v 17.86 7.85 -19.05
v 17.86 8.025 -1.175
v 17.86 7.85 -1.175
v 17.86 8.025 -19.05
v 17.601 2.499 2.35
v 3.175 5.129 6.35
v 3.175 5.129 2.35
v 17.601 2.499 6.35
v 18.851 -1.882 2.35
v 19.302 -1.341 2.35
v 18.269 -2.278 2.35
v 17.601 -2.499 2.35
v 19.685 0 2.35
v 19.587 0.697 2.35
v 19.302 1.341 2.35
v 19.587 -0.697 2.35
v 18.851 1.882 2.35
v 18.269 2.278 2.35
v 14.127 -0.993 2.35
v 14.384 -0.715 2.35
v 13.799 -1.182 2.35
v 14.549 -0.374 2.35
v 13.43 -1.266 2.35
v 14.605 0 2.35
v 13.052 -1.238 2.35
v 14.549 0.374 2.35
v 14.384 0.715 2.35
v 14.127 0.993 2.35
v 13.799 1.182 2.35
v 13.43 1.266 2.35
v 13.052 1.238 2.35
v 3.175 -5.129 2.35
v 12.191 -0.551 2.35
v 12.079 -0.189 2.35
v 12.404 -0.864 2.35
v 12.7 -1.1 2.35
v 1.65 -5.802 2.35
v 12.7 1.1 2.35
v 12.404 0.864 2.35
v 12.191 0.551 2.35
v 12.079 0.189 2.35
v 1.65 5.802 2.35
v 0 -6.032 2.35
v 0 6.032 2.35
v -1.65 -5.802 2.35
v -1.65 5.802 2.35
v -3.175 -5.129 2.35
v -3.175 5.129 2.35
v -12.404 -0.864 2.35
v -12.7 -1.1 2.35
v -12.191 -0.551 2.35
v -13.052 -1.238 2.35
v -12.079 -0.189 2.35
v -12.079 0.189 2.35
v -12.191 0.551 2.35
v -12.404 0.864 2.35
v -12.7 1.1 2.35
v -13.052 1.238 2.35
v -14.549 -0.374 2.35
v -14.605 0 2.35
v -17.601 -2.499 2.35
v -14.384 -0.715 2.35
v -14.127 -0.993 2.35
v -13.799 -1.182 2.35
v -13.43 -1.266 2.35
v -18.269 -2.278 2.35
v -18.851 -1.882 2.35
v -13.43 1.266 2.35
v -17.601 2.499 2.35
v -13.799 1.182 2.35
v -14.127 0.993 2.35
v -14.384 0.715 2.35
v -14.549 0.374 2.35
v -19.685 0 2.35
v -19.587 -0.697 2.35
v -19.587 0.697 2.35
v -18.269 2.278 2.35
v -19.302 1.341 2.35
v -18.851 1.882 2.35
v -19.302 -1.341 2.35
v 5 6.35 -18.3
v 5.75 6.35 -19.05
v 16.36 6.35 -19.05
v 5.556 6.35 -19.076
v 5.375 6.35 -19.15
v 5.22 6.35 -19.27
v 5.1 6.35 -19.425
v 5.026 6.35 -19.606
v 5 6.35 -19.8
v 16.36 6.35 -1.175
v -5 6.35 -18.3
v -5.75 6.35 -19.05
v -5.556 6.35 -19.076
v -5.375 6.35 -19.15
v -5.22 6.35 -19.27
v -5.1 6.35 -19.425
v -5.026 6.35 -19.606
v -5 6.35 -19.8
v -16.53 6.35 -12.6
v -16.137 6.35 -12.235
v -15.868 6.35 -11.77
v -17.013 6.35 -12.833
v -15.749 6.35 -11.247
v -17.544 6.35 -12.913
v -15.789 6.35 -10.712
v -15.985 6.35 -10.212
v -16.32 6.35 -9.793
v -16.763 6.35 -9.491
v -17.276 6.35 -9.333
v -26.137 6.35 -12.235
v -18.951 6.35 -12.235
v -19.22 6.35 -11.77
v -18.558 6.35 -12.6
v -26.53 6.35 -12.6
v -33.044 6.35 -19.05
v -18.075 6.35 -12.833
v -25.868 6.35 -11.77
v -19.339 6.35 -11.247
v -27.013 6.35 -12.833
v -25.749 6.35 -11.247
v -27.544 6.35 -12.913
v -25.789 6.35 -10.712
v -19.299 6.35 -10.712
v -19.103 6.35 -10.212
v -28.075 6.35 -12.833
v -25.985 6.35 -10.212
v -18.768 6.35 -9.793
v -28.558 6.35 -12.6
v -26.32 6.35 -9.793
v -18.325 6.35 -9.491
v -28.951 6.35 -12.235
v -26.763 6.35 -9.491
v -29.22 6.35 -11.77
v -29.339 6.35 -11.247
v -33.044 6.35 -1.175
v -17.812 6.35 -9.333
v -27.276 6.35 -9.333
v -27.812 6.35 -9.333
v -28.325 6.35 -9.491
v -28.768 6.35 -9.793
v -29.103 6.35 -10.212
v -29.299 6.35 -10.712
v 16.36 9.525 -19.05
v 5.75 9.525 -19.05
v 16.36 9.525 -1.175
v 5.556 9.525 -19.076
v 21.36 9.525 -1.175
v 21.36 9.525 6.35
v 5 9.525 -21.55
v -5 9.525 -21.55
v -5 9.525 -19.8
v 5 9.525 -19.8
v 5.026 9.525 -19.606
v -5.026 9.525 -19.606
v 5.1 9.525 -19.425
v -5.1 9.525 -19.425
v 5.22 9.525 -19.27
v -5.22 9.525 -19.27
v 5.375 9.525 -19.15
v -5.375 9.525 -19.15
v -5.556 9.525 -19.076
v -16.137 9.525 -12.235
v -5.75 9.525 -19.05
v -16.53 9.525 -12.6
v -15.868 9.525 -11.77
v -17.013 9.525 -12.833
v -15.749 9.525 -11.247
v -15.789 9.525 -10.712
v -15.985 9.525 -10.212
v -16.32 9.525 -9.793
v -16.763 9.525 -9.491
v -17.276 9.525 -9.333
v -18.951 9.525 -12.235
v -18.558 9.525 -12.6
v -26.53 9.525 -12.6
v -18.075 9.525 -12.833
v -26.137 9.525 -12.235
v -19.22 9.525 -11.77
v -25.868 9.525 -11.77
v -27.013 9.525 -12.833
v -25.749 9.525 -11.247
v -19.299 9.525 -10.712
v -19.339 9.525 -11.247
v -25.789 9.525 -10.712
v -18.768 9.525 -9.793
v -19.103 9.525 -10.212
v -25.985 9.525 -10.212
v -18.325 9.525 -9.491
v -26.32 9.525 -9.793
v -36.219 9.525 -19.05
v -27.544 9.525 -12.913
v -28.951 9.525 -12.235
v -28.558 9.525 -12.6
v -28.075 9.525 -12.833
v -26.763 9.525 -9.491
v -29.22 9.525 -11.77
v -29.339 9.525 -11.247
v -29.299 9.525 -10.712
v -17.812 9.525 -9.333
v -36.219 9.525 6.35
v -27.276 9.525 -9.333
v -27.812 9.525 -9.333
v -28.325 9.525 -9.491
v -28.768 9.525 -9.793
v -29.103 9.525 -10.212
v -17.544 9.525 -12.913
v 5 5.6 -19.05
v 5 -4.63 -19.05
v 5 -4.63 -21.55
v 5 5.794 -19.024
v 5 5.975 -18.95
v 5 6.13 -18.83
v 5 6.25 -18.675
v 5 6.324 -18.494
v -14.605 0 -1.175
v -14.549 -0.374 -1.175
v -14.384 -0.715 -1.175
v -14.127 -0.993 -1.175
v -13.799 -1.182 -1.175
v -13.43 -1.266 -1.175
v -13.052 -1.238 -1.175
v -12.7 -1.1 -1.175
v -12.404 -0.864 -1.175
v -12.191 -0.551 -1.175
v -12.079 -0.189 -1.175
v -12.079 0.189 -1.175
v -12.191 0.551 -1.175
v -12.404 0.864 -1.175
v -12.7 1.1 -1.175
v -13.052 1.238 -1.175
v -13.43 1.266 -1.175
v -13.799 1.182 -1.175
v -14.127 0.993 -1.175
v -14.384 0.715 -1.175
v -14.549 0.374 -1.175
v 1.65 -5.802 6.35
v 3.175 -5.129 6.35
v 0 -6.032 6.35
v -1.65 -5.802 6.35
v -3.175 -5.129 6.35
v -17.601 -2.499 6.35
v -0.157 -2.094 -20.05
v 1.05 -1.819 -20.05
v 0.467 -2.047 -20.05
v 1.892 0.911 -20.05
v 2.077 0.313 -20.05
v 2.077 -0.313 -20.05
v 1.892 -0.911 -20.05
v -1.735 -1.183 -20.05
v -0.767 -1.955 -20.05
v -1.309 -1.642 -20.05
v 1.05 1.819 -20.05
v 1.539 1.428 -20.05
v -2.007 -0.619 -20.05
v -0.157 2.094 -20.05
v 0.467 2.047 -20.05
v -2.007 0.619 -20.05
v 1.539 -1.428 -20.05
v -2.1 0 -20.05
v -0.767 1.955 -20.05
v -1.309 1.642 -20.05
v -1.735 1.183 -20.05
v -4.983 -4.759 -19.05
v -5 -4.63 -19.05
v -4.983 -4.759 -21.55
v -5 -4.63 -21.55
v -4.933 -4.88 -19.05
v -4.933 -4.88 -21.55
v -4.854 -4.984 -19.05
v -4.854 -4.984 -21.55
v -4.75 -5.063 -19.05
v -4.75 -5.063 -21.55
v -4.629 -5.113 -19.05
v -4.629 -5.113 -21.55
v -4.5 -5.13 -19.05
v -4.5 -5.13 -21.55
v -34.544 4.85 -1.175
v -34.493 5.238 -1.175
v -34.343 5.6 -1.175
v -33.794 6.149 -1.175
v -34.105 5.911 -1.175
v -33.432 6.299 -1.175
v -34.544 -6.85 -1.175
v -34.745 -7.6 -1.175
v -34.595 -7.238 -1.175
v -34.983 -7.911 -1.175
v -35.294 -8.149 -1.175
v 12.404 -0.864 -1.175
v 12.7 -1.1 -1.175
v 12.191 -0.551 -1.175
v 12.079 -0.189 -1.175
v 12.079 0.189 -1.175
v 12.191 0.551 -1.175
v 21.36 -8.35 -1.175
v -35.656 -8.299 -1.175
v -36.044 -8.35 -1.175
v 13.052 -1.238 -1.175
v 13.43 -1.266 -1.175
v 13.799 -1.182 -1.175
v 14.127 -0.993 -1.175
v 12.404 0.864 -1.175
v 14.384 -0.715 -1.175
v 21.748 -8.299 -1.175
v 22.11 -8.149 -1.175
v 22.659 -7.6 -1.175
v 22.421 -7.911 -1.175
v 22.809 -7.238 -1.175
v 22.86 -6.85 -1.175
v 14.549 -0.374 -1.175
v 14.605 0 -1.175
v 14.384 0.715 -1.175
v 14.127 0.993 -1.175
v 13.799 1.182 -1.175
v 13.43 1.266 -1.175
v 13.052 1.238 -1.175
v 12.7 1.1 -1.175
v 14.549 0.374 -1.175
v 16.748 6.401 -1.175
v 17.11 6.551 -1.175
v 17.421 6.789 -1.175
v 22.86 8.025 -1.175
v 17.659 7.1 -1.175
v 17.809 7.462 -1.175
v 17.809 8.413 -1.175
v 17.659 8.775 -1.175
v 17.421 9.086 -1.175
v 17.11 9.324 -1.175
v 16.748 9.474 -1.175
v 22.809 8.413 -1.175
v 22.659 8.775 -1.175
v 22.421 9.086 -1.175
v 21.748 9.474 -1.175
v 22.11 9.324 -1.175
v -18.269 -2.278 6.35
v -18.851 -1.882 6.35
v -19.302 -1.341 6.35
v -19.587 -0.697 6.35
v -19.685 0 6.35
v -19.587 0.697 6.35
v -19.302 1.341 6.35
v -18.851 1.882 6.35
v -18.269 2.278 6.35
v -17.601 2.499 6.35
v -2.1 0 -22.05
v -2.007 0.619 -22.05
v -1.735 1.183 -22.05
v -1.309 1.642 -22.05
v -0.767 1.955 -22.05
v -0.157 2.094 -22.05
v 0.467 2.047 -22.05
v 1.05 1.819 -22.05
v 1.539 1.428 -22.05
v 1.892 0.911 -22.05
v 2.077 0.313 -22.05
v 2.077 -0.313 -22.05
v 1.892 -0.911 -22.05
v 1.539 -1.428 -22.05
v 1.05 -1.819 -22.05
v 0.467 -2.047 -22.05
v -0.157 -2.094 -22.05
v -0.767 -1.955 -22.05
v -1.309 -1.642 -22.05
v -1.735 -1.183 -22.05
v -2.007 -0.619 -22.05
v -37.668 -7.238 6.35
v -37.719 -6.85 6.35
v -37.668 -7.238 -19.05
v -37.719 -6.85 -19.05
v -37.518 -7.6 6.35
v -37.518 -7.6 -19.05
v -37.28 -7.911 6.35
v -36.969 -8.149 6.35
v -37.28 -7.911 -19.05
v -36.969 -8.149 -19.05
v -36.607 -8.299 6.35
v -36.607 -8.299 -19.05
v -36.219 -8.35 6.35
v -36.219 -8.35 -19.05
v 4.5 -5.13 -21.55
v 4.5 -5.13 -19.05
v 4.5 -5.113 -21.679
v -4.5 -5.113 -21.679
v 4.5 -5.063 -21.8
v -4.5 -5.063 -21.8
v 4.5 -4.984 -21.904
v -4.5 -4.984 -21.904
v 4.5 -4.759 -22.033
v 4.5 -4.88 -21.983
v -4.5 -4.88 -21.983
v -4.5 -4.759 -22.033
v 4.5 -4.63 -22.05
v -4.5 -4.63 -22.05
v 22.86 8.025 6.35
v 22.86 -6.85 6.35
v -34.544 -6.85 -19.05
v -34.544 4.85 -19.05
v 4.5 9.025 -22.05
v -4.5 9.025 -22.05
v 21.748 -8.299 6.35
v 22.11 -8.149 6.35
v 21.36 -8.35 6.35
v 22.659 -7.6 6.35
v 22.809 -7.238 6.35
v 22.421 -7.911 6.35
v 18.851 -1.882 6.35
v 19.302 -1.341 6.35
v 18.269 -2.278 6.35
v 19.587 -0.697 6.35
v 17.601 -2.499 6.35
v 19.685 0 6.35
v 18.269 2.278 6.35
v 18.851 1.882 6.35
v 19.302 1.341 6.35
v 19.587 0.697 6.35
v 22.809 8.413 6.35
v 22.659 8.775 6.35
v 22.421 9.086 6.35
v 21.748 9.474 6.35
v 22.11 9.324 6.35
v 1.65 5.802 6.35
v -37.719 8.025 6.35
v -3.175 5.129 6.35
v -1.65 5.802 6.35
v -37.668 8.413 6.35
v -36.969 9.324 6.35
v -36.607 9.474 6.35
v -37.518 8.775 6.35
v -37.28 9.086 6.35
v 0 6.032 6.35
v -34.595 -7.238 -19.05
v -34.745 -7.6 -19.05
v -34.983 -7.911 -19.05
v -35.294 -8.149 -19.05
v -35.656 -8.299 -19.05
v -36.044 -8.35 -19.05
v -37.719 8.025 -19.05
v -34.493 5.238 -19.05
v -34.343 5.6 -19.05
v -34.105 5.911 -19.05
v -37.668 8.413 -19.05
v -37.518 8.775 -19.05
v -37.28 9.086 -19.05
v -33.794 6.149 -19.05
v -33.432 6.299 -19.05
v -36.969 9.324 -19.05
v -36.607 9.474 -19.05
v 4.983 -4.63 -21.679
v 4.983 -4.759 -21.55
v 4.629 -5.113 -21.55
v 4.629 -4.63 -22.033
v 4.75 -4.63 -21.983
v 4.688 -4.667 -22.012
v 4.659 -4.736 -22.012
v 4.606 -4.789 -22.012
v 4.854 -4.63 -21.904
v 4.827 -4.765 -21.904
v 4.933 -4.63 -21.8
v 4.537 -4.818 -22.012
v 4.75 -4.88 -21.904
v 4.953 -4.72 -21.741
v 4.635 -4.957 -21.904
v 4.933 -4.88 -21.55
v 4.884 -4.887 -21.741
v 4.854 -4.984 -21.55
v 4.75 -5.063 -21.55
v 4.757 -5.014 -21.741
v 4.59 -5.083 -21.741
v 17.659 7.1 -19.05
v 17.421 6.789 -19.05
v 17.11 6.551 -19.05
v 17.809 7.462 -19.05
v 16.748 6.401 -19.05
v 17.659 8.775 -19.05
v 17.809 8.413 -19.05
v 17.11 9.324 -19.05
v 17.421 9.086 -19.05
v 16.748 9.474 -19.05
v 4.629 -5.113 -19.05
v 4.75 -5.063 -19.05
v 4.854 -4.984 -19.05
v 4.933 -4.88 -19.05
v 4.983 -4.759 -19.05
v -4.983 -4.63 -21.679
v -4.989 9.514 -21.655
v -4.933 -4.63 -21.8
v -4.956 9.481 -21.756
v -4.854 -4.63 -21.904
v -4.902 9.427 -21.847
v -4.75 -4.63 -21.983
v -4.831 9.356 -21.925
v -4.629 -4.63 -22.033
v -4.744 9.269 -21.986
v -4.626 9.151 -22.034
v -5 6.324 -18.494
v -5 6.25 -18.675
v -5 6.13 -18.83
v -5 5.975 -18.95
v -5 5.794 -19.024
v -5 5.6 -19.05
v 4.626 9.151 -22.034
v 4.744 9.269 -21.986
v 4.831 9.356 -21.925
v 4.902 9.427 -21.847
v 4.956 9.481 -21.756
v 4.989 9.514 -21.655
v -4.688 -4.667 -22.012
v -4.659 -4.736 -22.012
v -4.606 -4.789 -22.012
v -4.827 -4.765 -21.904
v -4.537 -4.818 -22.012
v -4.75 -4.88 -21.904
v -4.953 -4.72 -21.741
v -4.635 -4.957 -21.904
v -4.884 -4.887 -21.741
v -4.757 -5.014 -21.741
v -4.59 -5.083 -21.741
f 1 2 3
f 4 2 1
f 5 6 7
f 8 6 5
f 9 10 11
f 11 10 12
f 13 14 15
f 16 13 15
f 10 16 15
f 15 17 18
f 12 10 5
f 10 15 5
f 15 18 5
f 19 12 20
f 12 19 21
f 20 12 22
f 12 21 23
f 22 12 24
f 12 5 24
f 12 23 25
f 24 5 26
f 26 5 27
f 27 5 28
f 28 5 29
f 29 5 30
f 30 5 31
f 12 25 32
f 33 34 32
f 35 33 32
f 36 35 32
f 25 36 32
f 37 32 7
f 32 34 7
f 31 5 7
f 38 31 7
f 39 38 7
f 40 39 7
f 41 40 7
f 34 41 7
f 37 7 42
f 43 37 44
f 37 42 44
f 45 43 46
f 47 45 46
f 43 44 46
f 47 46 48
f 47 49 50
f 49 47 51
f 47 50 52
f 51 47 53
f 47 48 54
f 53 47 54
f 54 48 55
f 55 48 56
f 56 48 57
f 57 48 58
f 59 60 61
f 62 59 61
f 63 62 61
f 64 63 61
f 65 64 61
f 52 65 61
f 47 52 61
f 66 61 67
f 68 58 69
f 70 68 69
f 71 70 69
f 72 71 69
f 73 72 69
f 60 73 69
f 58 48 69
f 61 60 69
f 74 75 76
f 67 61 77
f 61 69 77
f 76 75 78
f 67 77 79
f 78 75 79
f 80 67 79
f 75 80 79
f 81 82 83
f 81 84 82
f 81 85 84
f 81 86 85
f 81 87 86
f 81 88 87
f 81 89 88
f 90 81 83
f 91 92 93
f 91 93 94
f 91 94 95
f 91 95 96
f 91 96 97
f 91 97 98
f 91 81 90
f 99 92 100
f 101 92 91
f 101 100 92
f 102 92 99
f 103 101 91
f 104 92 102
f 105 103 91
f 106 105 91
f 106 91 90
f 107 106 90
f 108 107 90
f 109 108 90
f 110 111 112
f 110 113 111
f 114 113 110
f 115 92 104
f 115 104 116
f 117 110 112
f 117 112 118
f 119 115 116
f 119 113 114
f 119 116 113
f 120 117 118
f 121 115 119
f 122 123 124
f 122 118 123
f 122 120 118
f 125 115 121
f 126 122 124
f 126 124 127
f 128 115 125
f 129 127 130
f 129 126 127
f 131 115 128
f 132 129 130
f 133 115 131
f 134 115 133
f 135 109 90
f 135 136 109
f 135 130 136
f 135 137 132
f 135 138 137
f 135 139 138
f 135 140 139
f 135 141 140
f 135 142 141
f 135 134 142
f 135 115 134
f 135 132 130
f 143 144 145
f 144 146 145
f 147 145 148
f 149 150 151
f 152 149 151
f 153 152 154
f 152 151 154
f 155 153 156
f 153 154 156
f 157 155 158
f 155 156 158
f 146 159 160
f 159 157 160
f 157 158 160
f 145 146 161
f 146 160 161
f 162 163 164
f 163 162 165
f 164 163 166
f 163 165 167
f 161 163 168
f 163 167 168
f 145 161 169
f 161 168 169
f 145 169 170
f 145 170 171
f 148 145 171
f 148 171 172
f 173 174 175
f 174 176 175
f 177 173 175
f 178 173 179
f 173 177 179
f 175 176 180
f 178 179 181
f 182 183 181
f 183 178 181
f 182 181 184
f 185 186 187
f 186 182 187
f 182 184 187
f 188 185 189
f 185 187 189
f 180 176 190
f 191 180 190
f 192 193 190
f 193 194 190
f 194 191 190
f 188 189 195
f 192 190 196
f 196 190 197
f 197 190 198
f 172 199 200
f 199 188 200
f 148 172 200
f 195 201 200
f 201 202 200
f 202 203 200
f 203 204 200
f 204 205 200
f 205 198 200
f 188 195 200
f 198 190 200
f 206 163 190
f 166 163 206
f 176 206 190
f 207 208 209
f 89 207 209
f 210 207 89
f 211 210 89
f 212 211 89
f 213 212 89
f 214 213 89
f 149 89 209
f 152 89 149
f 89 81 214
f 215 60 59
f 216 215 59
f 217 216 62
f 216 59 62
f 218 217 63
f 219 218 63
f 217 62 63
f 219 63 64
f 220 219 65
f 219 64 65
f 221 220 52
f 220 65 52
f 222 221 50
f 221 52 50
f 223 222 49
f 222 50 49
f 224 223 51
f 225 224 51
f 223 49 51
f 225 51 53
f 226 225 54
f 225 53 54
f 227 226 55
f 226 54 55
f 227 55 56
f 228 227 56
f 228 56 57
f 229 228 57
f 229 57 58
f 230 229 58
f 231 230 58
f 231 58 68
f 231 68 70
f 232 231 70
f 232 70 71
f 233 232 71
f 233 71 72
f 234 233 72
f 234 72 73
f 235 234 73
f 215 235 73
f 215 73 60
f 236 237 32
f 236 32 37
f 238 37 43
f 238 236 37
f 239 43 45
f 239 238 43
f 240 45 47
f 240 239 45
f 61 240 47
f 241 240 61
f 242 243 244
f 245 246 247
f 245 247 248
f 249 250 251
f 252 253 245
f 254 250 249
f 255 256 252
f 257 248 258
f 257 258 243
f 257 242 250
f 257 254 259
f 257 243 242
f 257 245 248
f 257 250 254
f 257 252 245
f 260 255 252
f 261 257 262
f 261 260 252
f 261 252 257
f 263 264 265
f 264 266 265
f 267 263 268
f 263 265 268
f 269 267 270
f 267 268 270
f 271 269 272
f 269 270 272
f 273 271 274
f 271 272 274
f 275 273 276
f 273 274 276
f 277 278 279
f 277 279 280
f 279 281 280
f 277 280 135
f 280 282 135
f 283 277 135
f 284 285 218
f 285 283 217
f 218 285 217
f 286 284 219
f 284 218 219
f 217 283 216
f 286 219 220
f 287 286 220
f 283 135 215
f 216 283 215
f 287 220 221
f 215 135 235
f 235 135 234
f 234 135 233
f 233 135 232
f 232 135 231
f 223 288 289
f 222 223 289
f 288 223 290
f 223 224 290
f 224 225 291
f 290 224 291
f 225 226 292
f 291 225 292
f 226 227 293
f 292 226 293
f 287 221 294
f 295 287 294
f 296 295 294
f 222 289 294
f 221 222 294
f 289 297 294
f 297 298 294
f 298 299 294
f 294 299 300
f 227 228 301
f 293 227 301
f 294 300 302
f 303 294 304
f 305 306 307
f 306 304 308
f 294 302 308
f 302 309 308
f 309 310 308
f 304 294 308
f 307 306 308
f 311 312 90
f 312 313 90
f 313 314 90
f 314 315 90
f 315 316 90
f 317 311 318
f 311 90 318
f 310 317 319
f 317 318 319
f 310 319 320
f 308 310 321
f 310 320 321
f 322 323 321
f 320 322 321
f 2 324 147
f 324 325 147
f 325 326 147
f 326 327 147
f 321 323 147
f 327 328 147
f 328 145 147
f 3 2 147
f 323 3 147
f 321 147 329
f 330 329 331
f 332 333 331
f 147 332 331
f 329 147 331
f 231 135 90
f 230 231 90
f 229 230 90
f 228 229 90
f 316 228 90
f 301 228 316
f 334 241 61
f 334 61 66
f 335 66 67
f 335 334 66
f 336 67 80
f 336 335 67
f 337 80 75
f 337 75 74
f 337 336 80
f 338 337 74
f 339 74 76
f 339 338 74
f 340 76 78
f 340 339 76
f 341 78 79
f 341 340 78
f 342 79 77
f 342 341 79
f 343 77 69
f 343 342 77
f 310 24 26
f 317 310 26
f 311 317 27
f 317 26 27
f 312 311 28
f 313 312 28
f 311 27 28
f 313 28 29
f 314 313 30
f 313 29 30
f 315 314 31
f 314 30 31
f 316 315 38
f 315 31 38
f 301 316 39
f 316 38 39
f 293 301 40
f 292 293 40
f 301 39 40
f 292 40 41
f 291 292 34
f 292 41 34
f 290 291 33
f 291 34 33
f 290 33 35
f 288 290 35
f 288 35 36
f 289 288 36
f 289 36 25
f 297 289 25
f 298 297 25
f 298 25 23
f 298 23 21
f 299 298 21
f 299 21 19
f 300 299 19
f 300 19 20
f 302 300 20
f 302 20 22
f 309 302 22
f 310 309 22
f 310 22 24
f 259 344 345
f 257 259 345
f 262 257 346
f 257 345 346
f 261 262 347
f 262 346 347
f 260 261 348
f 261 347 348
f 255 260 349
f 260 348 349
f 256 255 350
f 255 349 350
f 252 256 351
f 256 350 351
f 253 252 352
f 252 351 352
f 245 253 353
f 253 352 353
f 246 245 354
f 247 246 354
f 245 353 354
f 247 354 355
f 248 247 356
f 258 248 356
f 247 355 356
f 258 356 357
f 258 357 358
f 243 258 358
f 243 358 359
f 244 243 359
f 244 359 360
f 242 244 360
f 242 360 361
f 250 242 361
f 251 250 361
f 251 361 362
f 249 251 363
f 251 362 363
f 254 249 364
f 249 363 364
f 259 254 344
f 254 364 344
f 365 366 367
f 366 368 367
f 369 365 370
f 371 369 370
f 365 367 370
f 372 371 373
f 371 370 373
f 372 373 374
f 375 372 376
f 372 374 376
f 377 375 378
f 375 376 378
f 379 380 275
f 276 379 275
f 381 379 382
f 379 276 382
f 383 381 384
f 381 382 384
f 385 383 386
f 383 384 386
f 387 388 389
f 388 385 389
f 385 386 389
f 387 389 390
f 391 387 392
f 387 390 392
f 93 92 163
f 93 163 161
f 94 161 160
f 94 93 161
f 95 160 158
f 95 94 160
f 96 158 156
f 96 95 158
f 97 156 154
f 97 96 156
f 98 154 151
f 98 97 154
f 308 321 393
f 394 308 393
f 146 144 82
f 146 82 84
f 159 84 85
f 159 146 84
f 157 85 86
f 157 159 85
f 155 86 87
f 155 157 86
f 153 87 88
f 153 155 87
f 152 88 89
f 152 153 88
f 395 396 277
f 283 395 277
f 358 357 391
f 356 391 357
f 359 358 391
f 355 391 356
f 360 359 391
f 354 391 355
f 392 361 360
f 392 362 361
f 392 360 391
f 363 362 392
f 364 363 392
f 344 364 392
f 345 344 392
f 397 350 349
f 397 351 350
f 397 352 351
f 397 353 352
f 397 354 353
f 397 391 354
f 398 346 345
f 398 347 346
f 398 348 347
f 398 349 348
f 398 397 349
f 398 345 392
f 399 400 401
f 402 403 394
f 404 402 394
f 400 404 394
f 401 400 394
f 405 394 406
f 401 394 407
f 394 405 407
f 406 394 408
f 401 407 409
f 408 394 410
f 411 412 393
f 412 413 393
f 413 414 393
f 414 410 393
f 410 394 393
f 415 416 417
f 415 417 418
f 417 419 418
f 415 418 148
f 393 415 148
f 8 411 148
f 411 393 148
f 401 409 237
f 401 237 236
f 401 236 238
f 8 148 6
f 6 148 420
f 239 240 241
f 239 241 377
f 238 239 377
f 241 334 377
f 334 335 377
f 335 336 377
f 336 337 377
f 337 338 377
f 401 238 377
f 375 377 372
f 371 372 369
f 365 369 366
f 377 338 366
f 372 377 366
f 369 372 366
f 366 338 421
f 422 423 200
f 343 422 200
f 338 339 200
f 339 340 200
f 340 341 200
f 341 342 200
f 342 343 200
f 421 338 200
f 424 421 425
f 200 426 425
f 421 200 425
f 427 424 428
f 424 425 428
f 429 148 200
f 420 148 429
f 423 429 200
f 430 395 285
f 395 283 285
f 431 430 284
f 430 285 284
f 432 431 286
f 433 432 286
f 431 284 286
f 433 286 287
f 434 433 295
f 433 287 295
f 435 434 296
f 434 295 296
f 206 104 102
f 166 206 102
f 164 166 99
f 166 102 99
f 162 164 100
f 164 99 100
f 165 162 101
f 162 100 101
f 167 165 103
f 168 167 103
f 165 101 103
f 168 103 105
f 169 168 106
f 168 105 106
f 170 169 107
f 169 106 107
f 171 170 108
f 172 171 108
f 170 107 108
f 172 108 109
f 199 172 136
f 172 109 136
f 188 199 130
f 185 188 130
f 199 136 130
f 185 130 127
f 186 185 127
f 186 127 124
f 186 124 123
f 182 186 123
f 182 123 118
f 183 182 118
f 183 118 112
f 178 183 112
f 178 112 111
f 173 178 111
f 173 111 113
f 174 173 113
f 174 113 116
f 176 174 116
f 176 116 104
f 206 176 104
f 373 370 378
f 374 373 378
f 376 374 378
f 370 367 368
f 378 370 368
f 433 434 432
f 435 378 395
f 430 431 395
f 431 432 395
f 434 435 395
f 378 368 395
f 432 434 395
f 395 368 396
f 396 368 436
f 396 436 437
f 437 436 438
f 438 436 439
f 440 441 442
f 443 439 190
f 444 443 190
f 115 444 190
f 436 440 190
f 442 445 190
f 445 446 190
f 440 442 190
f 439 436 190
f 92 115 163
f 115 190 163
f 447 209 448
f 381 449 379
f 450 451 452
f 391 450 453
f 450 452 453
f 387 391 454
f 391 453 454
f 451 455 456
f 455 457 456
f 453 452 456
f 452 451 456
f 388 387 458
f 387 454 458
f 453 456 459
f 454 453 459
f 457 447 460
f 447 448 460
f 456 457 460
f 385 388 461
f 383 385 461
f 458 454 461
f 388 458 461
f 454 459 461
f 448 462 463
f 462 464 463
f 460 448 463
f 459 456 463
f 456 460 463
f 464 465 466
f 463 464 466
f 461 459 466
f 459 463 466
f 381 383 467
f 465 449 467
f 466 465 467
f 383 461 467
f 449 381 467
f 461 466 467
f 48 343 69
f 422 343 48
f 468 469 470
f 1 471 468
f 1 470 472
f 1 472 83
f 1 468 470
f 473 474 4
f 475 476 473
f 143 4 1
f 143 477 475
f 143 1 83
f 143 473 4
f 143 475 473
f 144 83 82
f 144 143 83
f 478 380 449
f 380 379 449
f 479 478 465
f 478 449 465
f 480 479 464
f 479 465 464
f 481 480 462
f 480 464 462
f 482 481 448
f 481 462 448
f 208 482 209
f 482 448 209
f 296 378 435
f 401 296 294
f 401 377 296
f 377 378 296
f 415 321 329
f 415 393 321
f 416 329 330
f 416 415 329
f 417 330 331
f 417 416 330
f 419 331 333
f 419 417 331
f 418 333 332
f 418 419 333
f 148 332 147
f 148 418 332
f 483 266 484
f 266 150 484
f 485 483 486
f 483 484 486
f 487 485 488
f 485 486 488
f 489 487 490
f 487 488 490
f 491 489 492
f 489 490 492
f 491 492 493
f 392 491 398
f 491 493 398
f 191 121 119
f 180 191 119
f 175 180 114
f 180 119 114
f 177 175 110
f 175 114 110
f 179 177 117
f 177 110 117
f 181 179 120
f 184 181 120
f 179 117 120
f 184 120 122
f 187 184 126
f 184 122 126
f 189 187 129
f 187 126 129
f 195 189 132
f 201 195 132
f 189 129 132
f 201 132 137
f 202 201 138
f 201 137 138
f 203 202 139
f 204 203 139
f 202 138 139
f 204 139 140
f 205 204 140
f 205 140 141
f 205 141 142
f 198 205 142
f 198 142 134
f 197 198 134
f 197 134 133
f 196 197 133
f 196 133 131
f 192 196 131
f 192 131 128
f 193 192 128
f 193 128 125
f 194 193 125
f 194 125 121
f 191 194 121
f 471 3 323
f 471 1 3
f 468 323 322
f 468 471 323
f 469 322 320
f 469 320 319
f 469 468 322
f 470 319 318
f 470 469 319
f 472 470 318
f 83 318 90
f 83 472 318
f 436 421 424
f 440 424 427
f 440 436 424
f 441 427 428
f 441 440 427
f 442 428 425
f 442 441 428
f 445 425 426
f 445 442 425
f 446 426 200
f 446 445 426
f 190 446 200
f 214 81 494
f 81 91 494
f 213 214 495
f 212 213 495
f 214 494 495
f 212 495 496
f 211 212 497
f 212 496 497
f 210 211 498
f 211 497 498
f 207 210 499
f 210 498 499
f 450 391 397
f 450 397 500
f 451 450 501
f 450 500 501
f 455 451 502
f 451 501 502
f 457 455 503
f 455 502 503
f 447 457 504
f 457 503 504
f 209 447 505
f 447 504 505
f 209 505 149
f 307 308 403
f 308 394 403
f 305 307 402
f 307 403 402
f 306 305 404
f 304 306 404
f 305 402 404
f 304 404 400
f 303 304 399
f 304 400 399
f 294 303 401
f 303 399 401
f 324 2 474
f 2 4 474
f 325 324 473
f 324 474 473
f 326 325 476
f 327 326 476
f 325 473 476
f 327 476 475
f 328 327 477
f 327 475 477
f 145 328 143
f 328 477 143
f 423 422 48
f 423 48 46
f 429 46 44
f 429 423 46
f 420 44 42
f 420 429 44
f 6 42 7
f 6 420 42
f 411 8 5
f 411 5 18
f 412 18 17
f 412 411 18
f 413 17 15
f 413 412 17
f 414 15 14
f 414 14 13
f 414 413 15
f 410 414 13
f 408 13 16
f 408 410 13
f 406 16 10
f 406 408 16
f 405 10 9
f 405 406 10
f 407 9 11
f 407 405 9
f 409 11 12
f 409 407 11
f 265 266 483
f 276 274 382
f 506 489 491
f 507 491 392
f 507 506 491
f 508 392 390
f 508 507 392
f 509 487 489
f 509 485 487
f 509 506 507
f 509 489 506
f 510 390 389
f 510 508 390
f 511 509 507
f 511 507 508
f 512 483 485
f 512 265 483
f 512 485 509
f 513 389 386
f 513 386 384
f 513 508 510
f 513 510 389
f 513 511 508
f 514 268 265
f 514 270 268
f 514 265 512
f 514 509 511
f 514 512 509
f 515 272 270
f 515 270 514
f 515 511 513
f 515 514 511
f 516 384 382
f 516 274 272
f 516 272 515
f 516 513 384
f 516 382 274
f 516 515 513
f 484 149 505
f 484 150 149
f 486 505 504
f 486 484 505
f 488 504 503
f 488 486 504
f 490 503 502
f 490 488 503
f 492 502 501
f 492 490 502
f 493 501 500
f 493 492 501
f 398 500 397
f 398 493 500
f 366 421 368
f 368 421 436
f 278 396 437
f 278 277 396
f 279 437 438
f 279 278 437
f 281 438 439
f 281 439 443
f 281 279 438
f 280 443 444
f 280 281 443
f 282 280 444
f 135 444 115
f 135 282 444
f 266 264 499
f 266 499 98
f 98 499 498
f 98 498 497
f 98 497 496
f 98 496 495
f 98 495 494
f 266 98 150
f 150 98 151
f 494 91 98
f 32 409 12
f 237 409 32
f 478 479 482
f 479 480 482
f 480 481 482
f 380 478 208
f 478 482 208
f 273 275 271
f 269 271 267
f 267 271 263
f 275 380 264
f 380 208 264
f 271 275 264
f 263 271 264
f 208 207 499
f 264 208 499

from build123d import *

# Parameters (mm, degrees)
SKETCH1_W                       = 75.438
SKETCH1_H                       = 12.7
BOSS_EXTRUDE1_DEPTH             = 6.35
CUT_EXTRUDE1_DEPTH              = 4
BOSS_EXTRUDE2_REACH             = 40.773
SKETCH3_W                       = 75.438
SKETCH3_H                       = 19.05
SKETCH3_W_2                     = 69.088
SKETCH3_H_2                     = 12.7
BOSS_EXTRUDE2_DIRECTION_2_REACH = 40.773
SKETCH4_W                       = 75.438
SKETCH4_H                       = 25.4
BOSS_EXTRUDE4_DEPTH             = 3.175
SKETCH7_W                       = 14.859
SKETCH7_H                       = 15.875
CUT_EXTRUDE3_DEPTH              = 47.460828512
SKETCH8_W                       = 3.175
SKETCH8_H                       = 15.875
CUT_EXTRUDE4_DEPTH              = 65.214043371
BOSS_EXTRUDE5_DEPTH             = 3.175
SKETCH11_W                      = 57.404
SKETCH11_H                      = 12.7
CUT_EXTRUDE5_DEPTH              = 2
SKETCH12_R                      = 1.27
CUT_EXTRUDE6_DEPTH              = 45.400547136
SKETCH10_R                      = 1.8
CUT_EXTRUDE7_DEPTH              = 45.123864983
SKETCH13_W                      = 17.875
SKETCH13_H                      = 3.175
CUT_EXTRUDE8_DEPTH              = 5
SKETCH14_W                      = 10
SKETCH14_H                      = 14.655071008
BOSS_EXTRUDE6_DEPTH             = 3
SKETCH15_R                      = 2.1
CUT_EXTRUDE9_DEPTH              = 2
BOSS_EXTRUDE7_DEPTH             = 2
FILLET3_R                       = 0.5
FILLET4_R                       = 0.75
FILLET5_R                       = 0.75
FILLET6_R                       = 0.75
FILLET2_R                       = 1.5


with BuildPart() as part:
    # Sketch1 → Boss-Extrude1 (new body)
    with BuildSketch(Plane.XY):
        Rectangle(SKETCH1_W, SKETCH1_H)
    extrude(amount=BOSS_EXTRUDE1_DEPTH)

    # Sketch2 → Cut-Extrude1 (cut)
    with BuildSketch(Plane.XY.offset(6.35)):
        with BuildLine():
            Line((3.175, 5.129369479), (17.6006647, 2.498793645))
            ThreePointArc((17.6006647, 2.498793645), (19.685, 0), (17.6006647, -2.498793645))
            Line((17.6006647, -2.498793645), (3.175, -5.129369479))
            ThreePointArc((3.175, -5.129369479), (0, -6.0325), (-3.175, -5.129369479))
            Line((-3.175, -5.129369479), (-17.6006647, -2.498793645))
            ThreePointArc((-17.6006647, -2.498793645), (-19.685, 0), (-17.6006647, 2.498793645))
            Line((-17.6006647, 2.498793645), (-3.175, 5.129369479))
            ThreePointArc((-3.175, 5.129369479), (0, 6.0325), (3.175, 5.129369479))
        make_face()
    extrude(amount=-CUT_EXTRUDE1_DEPTH, mode=Mode.SUBTRACT)

    # Boss-Extrude2: up to this face of the body (flat: up to its plane)
    boss_extrude2_end = Plane(part.part.faces().sort_by_distance((0, 6.35, 3.175))[0])
    # Sketch3 → Boss-Extrude2 (add, up to the picked face)
    with BuildSketch(Plane(origin=(0, 0, 0), x_dir=(1, 0, 0), z_dir=(0, 1, 0)), mode=Mode.PRIVATE) as boss_extrude2_sk1:
        with Locations((0, 9.525)):
            Rectangle(SKETCH3_W, SKETCH3_H)
        with Locations((0, 9.525)):
            Rectangle(SKETCH3_W_2, SKETCH3_H_2, mode=Mode.SUBTRACT)
    boss_extrude2_tool1 = split(extrude(boss_extrude2_sk1.sketch, amount=BOSS_EXTRUDE2_REACH, mode=Mode.PRIVATE), bisect_by=boss_extrude2_end, keep=Keep.BOTH, mode=Mode.PRIVATE)
    add(boss_extrude2_tool1.solids().sort_by(Axis((0, 0, -0.778061), (0, 1, 0)))[0])

    # Boss-Extrude2 direction 2: up to this face of the body (flat: up to its plane)
    boss_extrude2_direction_2_end = Plane(part.part.faces().sort_by_distance((0, -6.35, 3.175))[0])
    # Sketch3 → Boss-Extrude2 direction 2 (add, up to the picked face)
    with BuildSketch(Plane(origin=(0, 0, 0), x_dir=(1, 0, 0), z_dir=(0, 1, 0)), mode=Mode.PRIVATE) as boss_extrude2_direction_2_sk1:
        with Locations((0, 9.525)):
            Rectangle(SKETCH3_W, SKETCH3_H)
        with Locations((0, 9.525)):
            Rectangle(SKETCH3_W_2, SKETCH3_H_2, mode=Mode.SUBTRACT)
    boss_extrude2_direction_2_tool1 = split(extrude(boss_extrude2_direction_2_sk1.sketch, amount=-BOSS_EXTRUDE2_DIRECTION_2_REACH, mode=Mode.PRIVATE), bisect_by=boss_extrude2_direction_2_end, keep=Keep.BOTH, mode=Mode.PRIVATE)
    add(boss_extrude2_direction_2_tool1.solids().sort_by(Axis((0, 0, -0.778061), (0, -1, 0)))[0])

    # Sketch4 → Boss-Extrude4 (add)
    with BuildSketch(Plane(origin=(0, 6.35, 0), x_dir=(1, 0, 0), z_dir=(0, 1, 0))):
        with Locations((0, 6.35)):
            Rectangle(SKETCH4_W, SKETCH4_H)
    extrude(amount=BOSS_EXTRUDE4_DEPTH)

    # Sketch7 → Cut-Extrude3 (cut, through all)
    with BuildSketch(Plane.XY.offset(6.35)):
        with Locations((30.2895, 1.5875)):
            Rectangle(SKETCH7_W, SKETCH7_H)
    extrude(amount=-CUT_EXTRUDE3_DEPTH, mode=Mode.SUBTRACT)

    # Sketch8 → Cut-Extrude4 (cut, through all)
    with BuildSketch(Plane(origin=(22.86, 0, 0), x_dir=(0, 0, -1), z_dir=(1, 0, 0))):
        with Locations((17.4625, 1.5875)):
            Rectangle(SKETCH8_W, SKETCH8_H)
    extrude(amount=-CUT_EXTRUDE4_DEPTH, mode=Mode.SUBTRACT)

    # Sketch9 → Boss-Extrude5 (add)
    with BuildSketch(Plane(origin=(0, 0, -15.875), x_dir=(-1, 0, 0), z_dir=(0, 0, -1))):
        Polygon((34.544, 6.35), (34.544, -6.35), (37.719, -6.35), (37.719, 9.525), (-22.86, 9.525), (-22.86, 6.35), align=None)
    extrude(amount=BOSS_EXTRUDE5_DEPTH)

    # Sketch11 → Cut-Extrude5 (cut)
    with BuildSketch(Plane(origin=(0, 0, -3.175), x_dir=(-1, 0, 0), z_dir=(0, 0, -1))):
        with Locations((5.842, 0)):
            Rectangle(SKETCH11_W, SKETCH11_H)
    extrude(amount=-CUT_EXTRUDE5_DEPTH, mode=Mode.SUBTRACT)

    # Sketch12 → Cut-Extrude6 (cut, through all)
    with BuildSketch(Plane.XY.offset(2.35)):
        with Locations((13.335, 0)):
            Circle(SKETCH12_R)
        with Locations(Location((-13.335, 0, 0), (0, 0, 180))):
            Circle(SKETCH12_R)
    extrude(amount=-CUT_EXTRUDE6_DEPTH, mode=Mode.SUBTRACT)

    # Sketch10 → Cut-Extrude7 (cut, through all)
    with BuildSketch(Plane.XZ.offset(-6.35)):
        with Locations(Location((-27.544, -11.1125, 0), (0, 0, 270))):
            Circle(SKETCH10_R)
        with Locations(Location((-17.544, -11.1125, 0), (0, 0, 270))):
            Circle(SKETCH10_R)
    extrude(amount=-CUT_EXTRUDE7_DEPTH, mode=Mode.SUBTRACT)

    # Sketch13 → Cut-Extrude8 (cut)
    with BuildSketch(Plane(origin=(22.86, 0, 0), x_dir=(0, 0, -1), z_dir=(1, 0, 0))):
        with Locations((10.1125, 7.9375)):
            Rectangle(SKETCH13_W, SKETCH13_H)
    extrude(amount=-CUT_EXTRUDE8_DEPTH, mode=Mode.SUBTRACT)

    # Sketch14 → Boss-Extrude6 (add)
    with BuildSketch(Plane(origin=(0, 0, -19.05), x_dir=(-1, 0, 0), z_dir=(0, 0, -1))):
        with Locations((0, 2.197464496)):
            Rectangle(SKETCH14_W, SKETCH14_H)
    extrude(amount=BOSS_EXTRUDE6_DEPTH)

    # Sketch15 → Cut-Extrude9 (cut)
    with BuildSketch(Plane(origin=(0, 0, -22.05), x_dir=(-1, 0, 0), z_dir=(0, 0, -1))):
        Circle(SKETCH15_R)
    extrude(amount=-CUT_EXTRUDE9_DEPTH, mode=Mode.SUBTRACT)

    # Sketch16 → Boss-Extrude7 (add)
    with BuildSketch(Plane.XZ.offset(6.35)):
        Polygon((-34.544, -19.05), (-34.544, -1.175), (22.86, -1.175), (22.86, 6.35), (-37.719, 6.35), (-37.719, -19.05), align=None)
    extrude(amount=BOSS_EXTRUDE7_DEPTH)

    # Fillet3
    fillet3_edges = [part.edges().sort_by_distance(p)[0] for p in [
        (-5, -5.130071008, -20.55),
        (5, -5.130071008, -20.55),
        (-5, 2.197464496, -22.05),
        (0, 9.525, -22.05),
        (5, 2.197464496, -22.05),
        (0, -5.130071008, -22.05),
    ]]
    fillet(fillet3_edges, radius=FILLET3_R)

    # Fillet4
    # the kernel refuses this fillet: 0.75 mm, written as the material it adds along each edge
    with BuildSketch(Plane(origin=(5, 9.525, -19.05), x_dir=(0, 0, -1), z_dir=(0, -1, 0))) as fillet4_piece_1:
        with BuildLine():
            CenterArc((FILLET4_R, FILLET4_R), FILLET4_R, 180, 90)
            Line((0, FILLET4_R), (0, 0))
            Line((0, 0), (FILLET4_R, 0))
        make_face()
    extrude(amount=3.175)

    # Fillet5
    # the kernel refuses this fillet: 0.75 mm, written as the material it adds along each edge
    with BuildSketch(Plane(origin=(-5, 6.35, -19.05), x_dir=(0, 0, -1), z_dir=(0, 1, 0))) as fillet5_piece_1:
        with BuildLine():
            CenterArc((FILLET5_R, FILLET5_R), FILLET5_R, 180, 90)
            Line((0, FILLET5_R), (0, 0))
            Line((0, 0), (FILLET5_R, 0))
        make_face()
    extrude(amount=3.175)

    # Fillet6
    fillet6_edges = [part.edges().sort_by_distance(p)[0] for p in [
        (0, 6.35, -19.05),
    ]]
    fillet(fillet6_edges, radius=FILLET6_R)

    # Fillet2
    fillet2_edges = [part.edges().sort_by_distance(p)[0] for p in [
        (22.86, 9.525, 2.5875),
        (17.86, 9.525, -10.1125),
        (17.86, 6.35, -10.1125),
        (-34.544, -8.35, -10.1125),
        (22.86, -8.35, 2.5875),
        (-37.719, -8.35, -6.35),
        (-34.544, 6.35, -10.1125),
        (-37.719, 9.525, -6.35),
    ]]
    fillet(fillet2_edges, radius=FILLET2_R)


solid = part.part
